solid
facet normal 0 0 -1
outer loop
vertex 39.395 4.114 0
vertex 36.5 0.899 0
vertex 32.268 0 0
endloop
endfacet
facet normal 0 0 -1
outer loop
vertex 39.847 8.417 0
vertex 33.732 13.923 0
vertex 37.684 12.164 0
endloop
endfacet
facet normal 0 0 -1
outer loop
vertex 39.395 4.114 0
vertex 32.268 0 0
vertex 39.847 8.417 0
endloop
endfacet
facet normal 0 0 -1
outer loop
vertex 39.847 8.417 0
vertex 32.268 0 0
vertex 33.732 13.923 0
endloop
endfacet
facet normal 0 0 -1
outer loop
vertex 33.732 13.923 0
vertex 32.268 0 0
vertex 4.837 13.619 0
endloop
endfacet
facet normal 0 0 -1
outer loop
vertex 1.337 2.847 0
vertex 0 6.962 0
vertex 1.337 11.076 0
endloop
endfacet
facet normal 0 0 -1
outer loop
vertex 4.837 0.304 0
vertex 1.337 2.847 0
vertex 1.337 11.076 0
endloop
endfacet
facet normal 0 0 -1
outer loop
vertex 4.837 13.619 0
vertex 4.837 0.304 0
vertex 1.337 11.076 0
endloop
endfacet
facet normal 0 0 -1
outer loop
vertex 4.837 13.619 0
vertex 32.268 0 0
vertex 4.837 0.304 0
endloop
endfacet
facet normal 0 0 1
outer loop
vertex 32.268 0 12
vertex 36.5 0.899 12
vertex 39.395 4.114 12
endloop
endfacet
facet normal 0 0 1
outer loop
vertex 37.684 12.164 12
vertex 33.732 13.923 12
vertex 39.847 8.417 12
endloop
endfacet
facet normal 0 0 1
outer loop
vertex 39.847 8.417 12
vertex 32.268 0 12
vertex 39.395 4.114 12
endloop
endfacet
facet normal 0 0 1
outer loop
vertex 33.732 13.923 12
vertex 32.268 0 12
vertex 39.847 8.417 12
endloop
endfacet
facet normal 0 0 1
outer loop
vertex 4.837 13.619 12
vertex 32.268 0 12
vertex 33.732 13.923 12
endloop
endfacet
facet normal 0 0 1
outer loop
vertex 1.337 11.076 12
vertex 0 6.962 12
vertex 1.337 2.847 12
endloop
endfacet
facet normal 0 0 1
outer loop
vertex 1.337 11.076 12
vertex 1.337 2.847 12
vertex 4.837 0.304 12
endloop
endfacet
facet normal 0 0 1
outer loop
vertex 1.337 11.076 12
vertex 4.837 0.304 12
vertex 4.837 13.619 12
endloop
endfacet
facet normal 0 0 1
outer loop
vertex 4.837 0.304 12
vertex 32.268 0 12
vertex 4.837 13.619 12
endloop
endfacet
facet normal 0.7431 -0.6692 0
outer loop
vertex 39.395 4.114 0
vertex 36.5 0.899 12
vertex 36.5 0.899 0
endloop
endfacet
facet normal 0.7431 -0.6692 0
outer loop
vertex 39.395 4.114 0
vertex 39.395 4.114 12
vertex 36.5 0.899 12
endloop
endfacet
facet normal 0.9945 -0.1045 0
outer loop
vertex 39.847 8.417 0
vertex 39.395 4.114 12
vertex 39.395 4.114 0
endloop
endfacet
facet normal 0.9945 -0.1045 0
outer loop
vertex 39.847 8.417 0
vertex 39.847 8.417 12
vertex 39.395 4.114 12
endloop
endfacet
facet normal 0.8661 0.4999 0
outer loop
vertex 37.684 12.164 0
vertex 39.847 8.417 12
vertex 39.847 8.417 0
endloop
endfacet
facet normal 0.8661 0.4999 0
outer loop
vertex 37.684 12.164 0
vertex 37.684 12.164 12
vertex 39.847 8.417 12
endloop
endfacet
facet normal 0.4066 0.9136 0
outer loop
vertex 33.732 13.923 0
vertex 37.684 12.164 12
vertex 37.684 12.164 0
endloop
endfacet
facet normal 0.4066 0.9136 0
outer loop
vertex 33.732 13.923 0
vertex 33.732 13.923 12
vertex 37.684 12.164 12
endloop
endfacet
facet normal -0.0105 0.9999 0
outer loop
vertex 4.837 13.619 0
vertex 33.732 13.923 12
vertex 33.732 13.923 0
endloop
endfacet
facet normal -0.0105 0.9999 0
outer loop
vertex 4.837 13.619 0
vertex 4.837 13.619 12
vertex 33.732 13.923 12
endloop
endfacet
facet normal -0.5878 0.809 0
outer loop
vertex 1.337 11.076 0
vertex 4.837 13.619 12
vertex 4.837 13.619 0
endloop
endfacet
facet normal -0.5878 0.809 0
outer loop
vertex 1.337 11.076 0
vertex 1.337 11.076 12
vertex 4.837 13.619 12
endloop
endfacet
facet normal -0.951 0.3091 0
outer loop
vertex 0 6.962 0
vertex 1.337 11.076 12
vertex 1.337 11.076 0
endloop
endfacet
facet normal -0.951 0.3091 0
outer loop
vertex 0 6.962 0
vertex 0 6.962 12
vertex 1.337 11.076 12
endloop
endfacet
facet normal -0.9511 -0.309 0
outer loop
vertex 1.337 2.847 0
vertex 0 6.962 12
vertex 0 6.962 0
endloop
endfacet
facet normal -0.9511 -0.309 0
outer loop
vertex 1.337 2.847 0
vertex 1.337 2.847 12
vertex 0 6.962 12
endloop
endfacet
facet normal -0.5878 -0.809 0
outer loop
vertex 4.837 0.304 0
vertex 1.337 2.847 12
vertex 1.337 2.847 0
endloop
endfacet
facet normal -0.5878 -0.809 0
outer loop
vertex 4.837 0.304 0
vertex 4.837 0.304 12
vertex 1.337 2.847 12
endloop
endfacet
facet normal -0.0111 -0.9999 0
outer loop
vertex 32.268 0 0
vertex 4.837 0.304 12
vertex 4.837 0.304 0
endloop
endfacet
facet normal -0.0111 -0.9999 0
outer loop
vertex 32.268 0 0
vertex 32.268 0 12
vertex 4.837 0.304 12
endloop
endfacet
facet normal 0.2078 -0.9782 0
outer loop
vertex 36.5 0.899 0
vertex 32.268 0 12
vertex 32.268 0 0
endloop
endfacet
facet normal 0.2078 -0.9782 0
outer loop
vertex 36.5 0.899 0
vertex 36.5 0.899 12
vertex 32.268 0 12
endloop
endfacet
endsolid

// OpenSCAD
$fn = 32;

// ----------------------------------------------------------------------
// Key bar: parallel key, 12 mm thick
// ----------------------------------------------------------------------

// --- parameters (mm) ---
profile_height = 12;      // extrusion height
profile_points = 11;      // points of the closed outline

profile = [[0, 6.962], [1.337, 2.847], [4.837, 0.304], [32.268, 0], [36.5, 0.899], [39.395, 4.114], [39.847, 8.417], [37.684, 12.164], [33.732, 13.923], [4.837, 13.619], [1.337, 11.076]];  // single closed polygon, 11 points, counter clockwise

// --- the one profile operation ---
linear_extrude(height = profile_height) polygon(points = profile);
